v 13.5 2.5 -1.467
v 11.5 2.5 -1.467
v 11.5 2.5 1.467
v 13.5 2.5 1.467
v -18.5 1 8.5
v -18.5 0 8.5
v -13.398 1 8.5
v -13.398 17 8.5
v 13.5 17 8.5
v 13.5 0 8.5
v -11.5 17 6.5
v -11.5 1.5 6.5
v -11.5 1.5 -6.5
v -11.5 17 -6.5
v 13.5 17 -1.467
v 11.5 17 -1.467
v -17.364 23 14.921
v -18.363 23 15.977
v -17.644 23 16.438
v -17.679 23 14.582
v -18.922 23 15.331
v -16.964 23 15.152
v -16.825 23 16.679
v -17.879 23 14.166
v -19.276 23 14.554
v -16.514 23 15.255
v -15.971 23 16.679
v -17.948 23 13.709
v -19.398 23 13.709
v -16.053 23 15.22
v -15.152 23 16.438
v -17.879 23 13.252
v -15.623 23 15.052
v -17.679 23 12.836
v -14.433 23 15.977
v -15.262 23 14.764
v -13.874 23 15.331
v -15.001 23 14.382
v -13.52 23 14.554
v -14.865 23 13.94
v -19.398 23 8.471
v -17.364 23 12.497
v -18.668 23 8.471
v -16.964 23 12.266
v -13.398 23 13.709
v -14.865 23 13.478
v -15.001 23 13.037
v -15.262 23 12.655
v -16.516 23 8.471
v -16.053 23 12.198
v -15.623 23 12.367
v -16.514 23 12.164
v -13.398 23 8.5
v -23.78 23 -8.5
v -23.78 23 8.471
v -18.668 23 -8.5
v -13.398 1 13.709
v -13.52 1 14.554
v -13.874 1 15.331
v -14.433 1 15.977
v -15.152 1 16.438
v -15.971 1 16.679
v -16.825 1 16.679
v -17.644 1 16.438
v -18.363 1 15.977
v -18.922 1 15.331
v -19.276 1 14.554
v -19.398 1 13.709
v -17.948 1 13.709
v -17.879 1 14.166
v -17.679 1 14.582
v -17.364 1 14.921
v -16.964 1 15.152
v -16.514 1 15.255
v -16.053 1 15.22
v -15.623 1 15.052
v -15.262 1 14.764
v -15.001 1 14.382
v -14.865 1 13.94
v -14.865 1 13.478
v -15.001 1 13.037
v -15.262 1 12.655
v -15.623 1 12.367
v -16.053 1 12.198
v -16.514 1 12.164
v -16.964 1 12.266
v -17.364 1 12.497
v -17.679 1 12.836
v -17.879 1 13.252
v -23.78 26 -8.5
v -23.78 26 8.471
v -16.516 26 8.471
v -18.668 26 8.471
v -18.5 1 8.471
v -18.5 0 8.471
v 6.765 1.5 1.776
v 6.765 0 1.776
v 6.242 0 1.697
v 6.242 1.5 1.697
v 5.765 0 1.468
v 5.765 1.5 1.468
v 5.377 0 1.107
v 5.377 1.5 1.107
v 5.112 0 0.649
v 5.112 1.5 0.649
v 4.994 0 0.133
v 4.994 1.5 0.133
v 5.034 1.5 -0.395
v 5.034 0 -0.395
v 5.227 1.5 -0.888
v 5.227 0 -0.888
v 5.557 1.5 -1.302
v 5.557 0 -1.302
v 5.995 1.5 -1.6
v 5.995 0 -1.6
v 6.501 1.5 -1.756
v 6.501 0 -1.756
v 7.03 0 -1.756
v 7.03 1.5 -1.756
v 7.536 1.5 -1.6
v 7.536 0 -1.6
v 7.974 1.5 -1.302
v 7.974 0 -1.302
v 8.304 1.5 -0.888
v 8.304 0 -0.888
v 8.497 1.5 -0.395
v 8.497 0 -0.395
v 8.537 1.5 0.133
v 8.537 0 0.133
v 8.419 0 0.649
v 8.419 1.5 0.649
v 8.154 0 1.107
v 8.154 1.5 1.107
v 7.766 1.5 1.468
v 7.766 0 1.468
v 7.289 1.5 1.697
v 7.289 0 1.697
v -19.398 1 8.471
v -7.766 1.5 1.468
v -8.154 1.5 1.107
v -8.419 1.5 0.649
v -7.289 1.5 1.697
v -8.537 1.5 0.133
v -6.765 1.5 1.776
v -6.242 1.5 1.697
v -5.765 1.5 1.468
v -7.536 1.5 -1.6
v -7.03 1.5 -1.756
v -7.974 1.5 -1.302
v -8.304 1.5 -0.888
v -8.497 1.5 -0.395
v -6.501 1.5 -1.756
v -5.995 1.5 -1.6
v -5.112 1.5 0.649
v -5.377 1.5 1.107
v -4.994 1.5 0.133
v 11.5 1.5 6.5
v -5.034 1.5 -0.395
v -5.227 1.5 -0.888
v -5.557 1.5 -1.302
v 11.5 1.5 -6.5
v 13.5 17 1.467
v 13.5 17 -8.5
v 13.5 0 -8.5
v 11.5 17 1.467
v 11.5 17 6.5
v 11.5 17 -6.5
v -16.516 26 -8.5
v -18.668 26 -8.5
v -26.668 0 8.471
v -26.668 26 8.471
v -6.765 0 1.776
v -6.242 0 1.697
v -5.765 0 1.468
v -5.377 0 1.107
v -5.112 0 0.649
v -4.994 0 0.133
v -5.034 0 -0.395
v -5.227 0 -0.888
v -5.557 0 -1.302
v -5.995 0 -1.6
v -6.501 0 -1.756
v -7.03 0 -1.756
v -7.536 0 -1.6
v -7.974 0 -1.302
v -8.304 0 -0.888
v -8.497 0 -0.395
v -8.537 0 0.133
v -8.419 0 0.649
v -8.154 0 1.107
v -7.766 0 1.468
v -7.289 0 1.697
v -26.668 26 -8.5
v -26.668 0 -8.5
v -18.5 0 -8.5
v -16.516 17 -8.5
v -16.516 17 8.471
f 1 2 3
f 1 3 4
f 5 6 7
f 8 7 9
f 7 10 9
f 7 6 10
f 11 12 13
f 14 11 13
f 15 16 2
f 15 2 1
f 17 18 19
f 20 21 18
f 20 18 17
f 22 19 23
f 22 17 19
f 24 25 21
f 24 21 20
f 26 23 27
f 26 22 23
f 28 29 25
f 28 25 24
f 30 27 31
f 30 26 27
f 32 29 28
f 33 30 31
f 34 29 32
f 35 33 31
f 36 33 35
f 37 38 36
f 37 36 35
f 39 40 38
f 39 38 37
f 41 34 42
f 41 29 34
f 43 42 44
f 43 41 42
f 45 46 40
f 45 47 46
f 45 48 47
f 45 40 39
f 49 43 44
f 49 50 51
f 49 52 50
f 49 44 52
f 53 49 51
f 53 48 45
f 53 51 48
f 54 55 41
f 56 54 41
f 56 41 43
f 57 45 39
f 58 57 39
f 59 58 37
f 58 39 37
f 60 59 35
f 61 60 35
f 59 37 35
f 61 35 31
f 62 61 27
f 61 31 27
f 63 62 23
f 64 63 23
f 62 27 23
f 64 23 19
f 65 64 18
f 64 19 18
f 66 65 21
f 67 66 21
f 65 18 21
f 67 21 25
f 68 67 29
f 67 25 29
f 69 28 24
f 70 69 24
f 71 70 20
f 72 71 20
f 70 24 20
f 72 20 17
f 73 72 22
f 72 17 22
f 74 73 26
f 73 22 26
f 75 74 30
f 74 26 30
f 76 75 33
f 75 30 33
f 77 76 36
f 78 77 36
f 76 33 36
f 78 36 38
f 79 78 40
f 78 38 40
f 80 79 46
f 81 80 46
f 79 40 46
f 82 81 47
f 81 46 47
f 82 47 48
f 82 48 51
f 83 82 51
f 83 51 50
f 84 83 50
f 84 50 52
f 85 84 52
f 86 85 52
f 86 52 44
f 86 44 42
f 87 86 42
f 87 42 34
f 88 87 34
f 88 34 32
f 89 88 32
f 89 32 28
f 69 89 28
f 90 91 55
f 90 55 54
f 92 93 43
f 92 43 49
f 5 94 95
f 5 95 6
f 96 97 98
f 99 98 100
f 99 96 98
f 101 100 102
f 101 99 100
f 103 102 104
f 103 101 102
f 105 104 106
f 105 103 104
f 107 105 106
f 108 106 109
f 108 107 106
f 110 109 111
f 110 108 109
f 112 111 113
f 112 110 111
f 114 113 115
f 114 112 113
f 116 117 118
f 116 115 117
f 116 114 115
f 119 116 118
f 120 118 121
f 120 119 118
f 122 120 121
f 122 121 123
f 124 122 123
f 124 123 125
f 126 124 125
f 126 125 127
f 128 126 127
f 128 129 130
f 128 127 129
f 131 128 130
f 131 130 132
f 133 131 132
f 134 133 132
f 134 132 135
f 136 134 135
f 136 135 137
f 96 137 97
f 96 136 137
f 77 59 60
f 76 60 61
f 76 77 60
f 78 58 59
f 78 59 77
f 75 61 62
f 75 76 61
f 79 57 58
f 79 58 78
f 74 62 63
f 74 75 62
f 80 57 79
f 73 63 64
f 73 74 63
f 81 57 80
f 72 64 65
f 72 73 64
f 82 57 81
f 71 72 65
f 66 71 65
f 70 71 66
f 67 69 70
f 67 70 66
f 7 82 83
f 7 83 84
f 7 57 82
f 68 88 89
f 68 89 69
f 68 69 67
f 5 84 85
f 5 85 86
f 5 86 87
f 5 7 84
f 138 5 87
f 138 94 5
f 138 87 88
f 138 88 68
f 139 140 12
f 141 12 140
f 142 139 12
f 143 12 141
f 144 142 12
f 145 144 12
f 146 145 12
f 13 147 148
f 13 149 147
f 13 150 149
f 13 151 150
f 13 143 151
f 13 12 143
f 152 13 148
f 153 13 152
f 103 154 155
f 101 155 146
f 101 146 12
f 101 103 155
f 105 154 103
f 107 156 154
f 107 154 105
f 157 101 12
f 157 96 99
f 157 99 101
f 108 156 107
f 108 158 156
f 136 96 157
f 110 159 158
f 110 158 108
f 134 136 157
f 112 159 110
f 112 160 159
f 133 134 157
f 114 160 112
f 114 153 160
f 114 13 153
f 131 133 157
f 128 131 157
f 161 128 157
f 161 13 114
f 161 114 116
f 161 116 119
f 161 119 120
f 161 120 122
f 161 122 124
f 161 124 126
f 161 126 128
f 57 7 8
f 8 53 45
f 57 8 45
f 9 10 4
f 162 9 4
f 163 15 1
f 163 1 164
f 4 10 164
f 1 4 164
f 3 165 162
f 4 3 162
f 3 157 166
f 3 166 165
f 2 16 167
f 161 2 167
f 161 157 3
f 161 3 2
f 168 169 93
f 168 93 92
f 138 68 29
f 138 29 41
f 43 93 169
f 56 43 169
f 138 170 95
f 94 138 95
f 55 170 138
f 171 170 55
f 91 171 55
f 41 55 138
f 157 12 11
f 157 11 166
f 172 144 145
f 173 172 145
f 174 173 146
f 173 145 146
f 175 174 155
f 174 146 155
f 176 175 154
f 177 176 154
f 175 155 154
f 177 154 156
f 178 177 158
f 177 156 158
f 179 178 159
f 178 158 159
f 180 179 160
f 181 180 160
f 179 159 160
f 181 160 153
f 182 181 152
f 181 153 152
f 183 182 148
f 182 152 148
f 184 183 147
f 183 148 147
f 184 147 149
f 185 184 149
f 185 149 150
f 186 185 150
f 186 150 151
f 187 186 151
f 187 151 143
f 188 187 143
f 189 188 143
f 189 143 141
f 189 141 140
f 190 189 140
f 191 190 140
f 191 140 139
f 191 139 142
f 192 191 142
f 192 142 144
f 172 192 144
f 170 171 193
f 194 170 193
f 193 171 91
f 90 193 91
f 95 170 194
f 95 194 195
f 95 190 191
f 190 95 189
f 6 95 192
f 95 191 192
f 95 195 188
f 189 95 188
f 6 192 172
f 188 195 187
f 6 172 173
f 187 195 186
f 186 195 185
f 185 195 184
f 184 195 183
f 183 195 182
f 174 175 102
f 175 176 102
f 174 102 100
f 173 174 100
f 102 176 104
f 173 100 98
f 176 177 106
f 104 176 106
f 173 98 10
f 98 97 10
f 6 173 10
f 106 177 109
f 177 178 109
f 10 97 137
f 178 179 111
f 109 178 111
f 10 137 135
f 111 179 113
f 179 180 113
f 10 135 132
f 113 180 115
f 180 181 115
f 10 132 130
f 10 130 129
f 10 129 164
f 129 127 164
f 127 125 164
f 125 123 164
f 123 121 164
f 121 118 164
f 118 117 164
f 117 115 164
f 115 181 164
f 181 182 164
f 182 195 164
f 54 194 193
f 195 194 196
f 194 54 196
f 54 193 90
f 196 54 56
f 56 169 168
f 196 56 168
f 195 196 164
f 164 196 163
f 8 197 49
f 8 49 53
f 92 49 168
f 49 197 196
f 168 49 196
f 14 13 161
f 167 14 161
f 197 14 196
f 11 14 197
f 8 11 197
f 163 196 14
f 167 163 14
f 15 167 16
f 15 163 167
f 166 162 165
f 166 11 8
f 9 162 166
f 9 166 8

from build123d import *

# Parameters (mm, degrees)
SKETCH1_W                 = 27
SKETCH1_H                 = 17
SKETCH1_W_2               = 23
SKETCH1_H_2               = 13
BOSS_EXTRUDE1_DEPTH       = 1.5
SKETCH1_3_W               = 27
SKETCH1_3_H               = 17
SKETCH1_3_W_2             = 23
SKETCH1_3_H_2             = 13
BOSS_EXTRUDE2_DEPTH       = 17
SKETCH2_W                 = 4.291322887
SKETCH2_H                 = 2.933386364
CUT_EXTRUDE1_DEPTH        = 14.5
SKETCH3_R                 = 1.776145291
CUT_EXTRUDE2_DEPTH        = 14.5
SKETCH4_W                 = 17
SKETCH4_H                 = 17
BOSS_EXTRUDE3_DEPTH       = 5
SKETCH5_W                 = 6.111771398
SKETCH5_H                 = 16.943398975
BOSS_EXTRUDE4_DEPTH       = 23
SKETCH6_R                 = 1.5
BOSS_EXTRUDE9_DEPTH       = 22
SKETCH10_W                = 10.152493364
SKETCH10_H                = 16.970590483
BOSS_EXTRUDE10_DEPTH      = 3
BOSS_EXTRUDE10_DEPTH_BACK = 23
SKETCH8_W                 = 5.111825198
SKETCH8_H                 = 22.20816513
CUT_EXTRUDE4_DEPTH        = 3
CUT_EXTRUDE4_DEPTH_BACK   = 3
SKETCH11_R                = 1.55
CUT_EXTRUDE5_DEPTH        = 31


with BuildPart() as part:
    # Sketch1 → Boss-Extrude1 (new body)
    with BuildSketch(Plane(origin=(0, 0, 0), x_dir=(1, 0, 0), z_dir=(0, 1, 0))):
        Rectangle(SKETCH1_W, SKETCH1_H)
        Rectangle(SKETCH1_W_2, SKETCH1_H_2, mode=Mode.SUBTRACT)
        Rectangle(SKETCH1_W_2, SKETCH1_H_2)
    extrude(amount=BOSS_EXTRUDE1_DEPTH)

    # Sketch1<3> → Boss-Extrude2 (add)
    with BuildSketch(Plane(origin=(0, 0, 0), x_dir=(1, 0, 0), z_dir=(0, 1, 0))):
        Rectangle(SKETCH1_3_W, SKETCH1_3_H)
        Rectangle(SKETCH1_3_W_2, SKETCH1_3_H_2, mode=Mode.SUBTRACT)
    extrude(amount=BOSS_EXTRUDE2_DEPTH)

    # Sketch2 → Cut-Extrude1 (cut)
    with BuildSketch(Plane(origin=(0, 17, 0), x_dir=(1, 0, 0), z_dir=(0, 1, 0))):
        with Locations((12.620499192, 0)):
            Rectangle(SKETCH2_W, SKETCH2_H)
    extrude(amount=-CUT_EXTRUDE1_DEPTH, mode=Mode.SUBTRACT)

    # Sketch3 → Cut-Extrude2 (cut)
    with BuildSketch(Plane(origin=(0, 1.5, 0), x_dir=(1, 0, 0), z_dir=(0, 1, 0))):
        with Locations(Location((-6.765421027, 0, 0), (0, 0, 270))):
            Circle(SKETCH3_R)
    cut_extrude2 = extrude(amount=-CUT_EXTRUDE2_DEPTH, mode=Mode.SUBTRACT)

    # Mirror1: Cut-Extrude2 across plane
    add(cut_extrude2.mirror(Plane(origin=(0, 0, 0), x_dir=(0, 0, 1), z_dir=(1, 0, 0))), mode=Mode.SUBTRACT)

    # Sketch4 → Boss-Extrude3 (add)
    with BuildSketch(Plane.ZY.offset(13.5)):
        with Locations((0, 8.5)):
            Rectangle(SKETCH4_W, SKETCH4_H)
    extrude(amount=BOSS_EXTRUDE3_DEPTH)

    # Sketch5 → Boss-Extrude4 (add)
    with BuildSketch(Plane.XZ):
        with Locations((-21.555885699, -0.028300512)):
            Rectangle(SKETCH5_W, SKETCH5_H)
    extrude(amount=-BOSS_EXTRUDE4_DEPTH)



with BuildPart() as body_2:
    # Sketch6 → Boss-Extrude9 (new body)
    with BuildSketch(Plane(origin=(0, 23, 0), x_dir=(1, 0, 0), z_dir=(0, 1, 0))):
        with BuildLine():
            Line((-19.397979401, -13.709269216), (-19.397979401, -8.443398975))
            Line((-19.397979401, -8.443398975), (-13.397979401, -8.5))
            Line((-13.397979401, -8.5), (-13.397979401, -13.709269216))
            ThreePointArc((-13.397979401, -13.709269216), (-16.397979401, -16.709269216), (-19.397979401, -13.709269216))
        make_face()
        with Locations(Location((-16.397979401, -13.709269216, 0), (0, 0, 180))):
            Circle(SKETCH6_R, mode=Mode.SUBTRACT)
    extrude(amount=-BOSS_EXTRUDE9_DEPTH)


with BuildPart() as part_1:
    add(part.part)

    add(body_2.part)  # Boss-Extrude10 merges body 2
    # Sketch10 → Boss-Extrude10 (add, two sides)
    with BuildSketch(Plane(origin=(0, 23, 0), x_dir=(1, 0, 0), z_dir=(0, 1, 0))) as boss_extrude10_sk:
        with Locations((-21.591786232, 0.014704758)):
            Rectangle(SKETCH10_W, SKETCH10_H)
    extrude(amount=BOSS_EXTRUDE10_DEPTH)
    extrude(boss_extrude10_sk.sketch, amount=-BOSS_EXTRUDE10_DEPTH_BACK)

    # Sketch8 → Cut-Extrude4 (cut, two sides)
    with BuildSketch(Plane(origin=(0, 26, 0), x_dir=(1, 0, 0), z_dir=(0, 1, 0))) as cut_extrude4_sk:
        with Locations((-21.223699311, -0.490089781)):
            Rectangle(SKETCH8_W, SKETCH8_H)
    extrude(amount=CUT_EXTRUDE4_DEPTH, mode=Mode.SUBTRACT)
    extrude(cut_extrude4_sk.sketch, amount=-CUT_EXTRUDE4_DEPTH_BACK, mode=Mode.SUBTRACT)

    # Sketch11 → Cut-Extrude5 (cut)
    with BuildSketch(Plane(origin=(0, 23, 0), x_dir=(1, 0, 0), z_dir=(0, 1, 0))):
        with Locations(Location((-16.397979401, -13.709269216, 0), (0, 0, 180))):
            Circle(SKETCH11_R)
    extrude(amount=-CUT_EXTRUDE5_DEPTH, mode=Mode.SUBTRACT)


solid = part_1.part
